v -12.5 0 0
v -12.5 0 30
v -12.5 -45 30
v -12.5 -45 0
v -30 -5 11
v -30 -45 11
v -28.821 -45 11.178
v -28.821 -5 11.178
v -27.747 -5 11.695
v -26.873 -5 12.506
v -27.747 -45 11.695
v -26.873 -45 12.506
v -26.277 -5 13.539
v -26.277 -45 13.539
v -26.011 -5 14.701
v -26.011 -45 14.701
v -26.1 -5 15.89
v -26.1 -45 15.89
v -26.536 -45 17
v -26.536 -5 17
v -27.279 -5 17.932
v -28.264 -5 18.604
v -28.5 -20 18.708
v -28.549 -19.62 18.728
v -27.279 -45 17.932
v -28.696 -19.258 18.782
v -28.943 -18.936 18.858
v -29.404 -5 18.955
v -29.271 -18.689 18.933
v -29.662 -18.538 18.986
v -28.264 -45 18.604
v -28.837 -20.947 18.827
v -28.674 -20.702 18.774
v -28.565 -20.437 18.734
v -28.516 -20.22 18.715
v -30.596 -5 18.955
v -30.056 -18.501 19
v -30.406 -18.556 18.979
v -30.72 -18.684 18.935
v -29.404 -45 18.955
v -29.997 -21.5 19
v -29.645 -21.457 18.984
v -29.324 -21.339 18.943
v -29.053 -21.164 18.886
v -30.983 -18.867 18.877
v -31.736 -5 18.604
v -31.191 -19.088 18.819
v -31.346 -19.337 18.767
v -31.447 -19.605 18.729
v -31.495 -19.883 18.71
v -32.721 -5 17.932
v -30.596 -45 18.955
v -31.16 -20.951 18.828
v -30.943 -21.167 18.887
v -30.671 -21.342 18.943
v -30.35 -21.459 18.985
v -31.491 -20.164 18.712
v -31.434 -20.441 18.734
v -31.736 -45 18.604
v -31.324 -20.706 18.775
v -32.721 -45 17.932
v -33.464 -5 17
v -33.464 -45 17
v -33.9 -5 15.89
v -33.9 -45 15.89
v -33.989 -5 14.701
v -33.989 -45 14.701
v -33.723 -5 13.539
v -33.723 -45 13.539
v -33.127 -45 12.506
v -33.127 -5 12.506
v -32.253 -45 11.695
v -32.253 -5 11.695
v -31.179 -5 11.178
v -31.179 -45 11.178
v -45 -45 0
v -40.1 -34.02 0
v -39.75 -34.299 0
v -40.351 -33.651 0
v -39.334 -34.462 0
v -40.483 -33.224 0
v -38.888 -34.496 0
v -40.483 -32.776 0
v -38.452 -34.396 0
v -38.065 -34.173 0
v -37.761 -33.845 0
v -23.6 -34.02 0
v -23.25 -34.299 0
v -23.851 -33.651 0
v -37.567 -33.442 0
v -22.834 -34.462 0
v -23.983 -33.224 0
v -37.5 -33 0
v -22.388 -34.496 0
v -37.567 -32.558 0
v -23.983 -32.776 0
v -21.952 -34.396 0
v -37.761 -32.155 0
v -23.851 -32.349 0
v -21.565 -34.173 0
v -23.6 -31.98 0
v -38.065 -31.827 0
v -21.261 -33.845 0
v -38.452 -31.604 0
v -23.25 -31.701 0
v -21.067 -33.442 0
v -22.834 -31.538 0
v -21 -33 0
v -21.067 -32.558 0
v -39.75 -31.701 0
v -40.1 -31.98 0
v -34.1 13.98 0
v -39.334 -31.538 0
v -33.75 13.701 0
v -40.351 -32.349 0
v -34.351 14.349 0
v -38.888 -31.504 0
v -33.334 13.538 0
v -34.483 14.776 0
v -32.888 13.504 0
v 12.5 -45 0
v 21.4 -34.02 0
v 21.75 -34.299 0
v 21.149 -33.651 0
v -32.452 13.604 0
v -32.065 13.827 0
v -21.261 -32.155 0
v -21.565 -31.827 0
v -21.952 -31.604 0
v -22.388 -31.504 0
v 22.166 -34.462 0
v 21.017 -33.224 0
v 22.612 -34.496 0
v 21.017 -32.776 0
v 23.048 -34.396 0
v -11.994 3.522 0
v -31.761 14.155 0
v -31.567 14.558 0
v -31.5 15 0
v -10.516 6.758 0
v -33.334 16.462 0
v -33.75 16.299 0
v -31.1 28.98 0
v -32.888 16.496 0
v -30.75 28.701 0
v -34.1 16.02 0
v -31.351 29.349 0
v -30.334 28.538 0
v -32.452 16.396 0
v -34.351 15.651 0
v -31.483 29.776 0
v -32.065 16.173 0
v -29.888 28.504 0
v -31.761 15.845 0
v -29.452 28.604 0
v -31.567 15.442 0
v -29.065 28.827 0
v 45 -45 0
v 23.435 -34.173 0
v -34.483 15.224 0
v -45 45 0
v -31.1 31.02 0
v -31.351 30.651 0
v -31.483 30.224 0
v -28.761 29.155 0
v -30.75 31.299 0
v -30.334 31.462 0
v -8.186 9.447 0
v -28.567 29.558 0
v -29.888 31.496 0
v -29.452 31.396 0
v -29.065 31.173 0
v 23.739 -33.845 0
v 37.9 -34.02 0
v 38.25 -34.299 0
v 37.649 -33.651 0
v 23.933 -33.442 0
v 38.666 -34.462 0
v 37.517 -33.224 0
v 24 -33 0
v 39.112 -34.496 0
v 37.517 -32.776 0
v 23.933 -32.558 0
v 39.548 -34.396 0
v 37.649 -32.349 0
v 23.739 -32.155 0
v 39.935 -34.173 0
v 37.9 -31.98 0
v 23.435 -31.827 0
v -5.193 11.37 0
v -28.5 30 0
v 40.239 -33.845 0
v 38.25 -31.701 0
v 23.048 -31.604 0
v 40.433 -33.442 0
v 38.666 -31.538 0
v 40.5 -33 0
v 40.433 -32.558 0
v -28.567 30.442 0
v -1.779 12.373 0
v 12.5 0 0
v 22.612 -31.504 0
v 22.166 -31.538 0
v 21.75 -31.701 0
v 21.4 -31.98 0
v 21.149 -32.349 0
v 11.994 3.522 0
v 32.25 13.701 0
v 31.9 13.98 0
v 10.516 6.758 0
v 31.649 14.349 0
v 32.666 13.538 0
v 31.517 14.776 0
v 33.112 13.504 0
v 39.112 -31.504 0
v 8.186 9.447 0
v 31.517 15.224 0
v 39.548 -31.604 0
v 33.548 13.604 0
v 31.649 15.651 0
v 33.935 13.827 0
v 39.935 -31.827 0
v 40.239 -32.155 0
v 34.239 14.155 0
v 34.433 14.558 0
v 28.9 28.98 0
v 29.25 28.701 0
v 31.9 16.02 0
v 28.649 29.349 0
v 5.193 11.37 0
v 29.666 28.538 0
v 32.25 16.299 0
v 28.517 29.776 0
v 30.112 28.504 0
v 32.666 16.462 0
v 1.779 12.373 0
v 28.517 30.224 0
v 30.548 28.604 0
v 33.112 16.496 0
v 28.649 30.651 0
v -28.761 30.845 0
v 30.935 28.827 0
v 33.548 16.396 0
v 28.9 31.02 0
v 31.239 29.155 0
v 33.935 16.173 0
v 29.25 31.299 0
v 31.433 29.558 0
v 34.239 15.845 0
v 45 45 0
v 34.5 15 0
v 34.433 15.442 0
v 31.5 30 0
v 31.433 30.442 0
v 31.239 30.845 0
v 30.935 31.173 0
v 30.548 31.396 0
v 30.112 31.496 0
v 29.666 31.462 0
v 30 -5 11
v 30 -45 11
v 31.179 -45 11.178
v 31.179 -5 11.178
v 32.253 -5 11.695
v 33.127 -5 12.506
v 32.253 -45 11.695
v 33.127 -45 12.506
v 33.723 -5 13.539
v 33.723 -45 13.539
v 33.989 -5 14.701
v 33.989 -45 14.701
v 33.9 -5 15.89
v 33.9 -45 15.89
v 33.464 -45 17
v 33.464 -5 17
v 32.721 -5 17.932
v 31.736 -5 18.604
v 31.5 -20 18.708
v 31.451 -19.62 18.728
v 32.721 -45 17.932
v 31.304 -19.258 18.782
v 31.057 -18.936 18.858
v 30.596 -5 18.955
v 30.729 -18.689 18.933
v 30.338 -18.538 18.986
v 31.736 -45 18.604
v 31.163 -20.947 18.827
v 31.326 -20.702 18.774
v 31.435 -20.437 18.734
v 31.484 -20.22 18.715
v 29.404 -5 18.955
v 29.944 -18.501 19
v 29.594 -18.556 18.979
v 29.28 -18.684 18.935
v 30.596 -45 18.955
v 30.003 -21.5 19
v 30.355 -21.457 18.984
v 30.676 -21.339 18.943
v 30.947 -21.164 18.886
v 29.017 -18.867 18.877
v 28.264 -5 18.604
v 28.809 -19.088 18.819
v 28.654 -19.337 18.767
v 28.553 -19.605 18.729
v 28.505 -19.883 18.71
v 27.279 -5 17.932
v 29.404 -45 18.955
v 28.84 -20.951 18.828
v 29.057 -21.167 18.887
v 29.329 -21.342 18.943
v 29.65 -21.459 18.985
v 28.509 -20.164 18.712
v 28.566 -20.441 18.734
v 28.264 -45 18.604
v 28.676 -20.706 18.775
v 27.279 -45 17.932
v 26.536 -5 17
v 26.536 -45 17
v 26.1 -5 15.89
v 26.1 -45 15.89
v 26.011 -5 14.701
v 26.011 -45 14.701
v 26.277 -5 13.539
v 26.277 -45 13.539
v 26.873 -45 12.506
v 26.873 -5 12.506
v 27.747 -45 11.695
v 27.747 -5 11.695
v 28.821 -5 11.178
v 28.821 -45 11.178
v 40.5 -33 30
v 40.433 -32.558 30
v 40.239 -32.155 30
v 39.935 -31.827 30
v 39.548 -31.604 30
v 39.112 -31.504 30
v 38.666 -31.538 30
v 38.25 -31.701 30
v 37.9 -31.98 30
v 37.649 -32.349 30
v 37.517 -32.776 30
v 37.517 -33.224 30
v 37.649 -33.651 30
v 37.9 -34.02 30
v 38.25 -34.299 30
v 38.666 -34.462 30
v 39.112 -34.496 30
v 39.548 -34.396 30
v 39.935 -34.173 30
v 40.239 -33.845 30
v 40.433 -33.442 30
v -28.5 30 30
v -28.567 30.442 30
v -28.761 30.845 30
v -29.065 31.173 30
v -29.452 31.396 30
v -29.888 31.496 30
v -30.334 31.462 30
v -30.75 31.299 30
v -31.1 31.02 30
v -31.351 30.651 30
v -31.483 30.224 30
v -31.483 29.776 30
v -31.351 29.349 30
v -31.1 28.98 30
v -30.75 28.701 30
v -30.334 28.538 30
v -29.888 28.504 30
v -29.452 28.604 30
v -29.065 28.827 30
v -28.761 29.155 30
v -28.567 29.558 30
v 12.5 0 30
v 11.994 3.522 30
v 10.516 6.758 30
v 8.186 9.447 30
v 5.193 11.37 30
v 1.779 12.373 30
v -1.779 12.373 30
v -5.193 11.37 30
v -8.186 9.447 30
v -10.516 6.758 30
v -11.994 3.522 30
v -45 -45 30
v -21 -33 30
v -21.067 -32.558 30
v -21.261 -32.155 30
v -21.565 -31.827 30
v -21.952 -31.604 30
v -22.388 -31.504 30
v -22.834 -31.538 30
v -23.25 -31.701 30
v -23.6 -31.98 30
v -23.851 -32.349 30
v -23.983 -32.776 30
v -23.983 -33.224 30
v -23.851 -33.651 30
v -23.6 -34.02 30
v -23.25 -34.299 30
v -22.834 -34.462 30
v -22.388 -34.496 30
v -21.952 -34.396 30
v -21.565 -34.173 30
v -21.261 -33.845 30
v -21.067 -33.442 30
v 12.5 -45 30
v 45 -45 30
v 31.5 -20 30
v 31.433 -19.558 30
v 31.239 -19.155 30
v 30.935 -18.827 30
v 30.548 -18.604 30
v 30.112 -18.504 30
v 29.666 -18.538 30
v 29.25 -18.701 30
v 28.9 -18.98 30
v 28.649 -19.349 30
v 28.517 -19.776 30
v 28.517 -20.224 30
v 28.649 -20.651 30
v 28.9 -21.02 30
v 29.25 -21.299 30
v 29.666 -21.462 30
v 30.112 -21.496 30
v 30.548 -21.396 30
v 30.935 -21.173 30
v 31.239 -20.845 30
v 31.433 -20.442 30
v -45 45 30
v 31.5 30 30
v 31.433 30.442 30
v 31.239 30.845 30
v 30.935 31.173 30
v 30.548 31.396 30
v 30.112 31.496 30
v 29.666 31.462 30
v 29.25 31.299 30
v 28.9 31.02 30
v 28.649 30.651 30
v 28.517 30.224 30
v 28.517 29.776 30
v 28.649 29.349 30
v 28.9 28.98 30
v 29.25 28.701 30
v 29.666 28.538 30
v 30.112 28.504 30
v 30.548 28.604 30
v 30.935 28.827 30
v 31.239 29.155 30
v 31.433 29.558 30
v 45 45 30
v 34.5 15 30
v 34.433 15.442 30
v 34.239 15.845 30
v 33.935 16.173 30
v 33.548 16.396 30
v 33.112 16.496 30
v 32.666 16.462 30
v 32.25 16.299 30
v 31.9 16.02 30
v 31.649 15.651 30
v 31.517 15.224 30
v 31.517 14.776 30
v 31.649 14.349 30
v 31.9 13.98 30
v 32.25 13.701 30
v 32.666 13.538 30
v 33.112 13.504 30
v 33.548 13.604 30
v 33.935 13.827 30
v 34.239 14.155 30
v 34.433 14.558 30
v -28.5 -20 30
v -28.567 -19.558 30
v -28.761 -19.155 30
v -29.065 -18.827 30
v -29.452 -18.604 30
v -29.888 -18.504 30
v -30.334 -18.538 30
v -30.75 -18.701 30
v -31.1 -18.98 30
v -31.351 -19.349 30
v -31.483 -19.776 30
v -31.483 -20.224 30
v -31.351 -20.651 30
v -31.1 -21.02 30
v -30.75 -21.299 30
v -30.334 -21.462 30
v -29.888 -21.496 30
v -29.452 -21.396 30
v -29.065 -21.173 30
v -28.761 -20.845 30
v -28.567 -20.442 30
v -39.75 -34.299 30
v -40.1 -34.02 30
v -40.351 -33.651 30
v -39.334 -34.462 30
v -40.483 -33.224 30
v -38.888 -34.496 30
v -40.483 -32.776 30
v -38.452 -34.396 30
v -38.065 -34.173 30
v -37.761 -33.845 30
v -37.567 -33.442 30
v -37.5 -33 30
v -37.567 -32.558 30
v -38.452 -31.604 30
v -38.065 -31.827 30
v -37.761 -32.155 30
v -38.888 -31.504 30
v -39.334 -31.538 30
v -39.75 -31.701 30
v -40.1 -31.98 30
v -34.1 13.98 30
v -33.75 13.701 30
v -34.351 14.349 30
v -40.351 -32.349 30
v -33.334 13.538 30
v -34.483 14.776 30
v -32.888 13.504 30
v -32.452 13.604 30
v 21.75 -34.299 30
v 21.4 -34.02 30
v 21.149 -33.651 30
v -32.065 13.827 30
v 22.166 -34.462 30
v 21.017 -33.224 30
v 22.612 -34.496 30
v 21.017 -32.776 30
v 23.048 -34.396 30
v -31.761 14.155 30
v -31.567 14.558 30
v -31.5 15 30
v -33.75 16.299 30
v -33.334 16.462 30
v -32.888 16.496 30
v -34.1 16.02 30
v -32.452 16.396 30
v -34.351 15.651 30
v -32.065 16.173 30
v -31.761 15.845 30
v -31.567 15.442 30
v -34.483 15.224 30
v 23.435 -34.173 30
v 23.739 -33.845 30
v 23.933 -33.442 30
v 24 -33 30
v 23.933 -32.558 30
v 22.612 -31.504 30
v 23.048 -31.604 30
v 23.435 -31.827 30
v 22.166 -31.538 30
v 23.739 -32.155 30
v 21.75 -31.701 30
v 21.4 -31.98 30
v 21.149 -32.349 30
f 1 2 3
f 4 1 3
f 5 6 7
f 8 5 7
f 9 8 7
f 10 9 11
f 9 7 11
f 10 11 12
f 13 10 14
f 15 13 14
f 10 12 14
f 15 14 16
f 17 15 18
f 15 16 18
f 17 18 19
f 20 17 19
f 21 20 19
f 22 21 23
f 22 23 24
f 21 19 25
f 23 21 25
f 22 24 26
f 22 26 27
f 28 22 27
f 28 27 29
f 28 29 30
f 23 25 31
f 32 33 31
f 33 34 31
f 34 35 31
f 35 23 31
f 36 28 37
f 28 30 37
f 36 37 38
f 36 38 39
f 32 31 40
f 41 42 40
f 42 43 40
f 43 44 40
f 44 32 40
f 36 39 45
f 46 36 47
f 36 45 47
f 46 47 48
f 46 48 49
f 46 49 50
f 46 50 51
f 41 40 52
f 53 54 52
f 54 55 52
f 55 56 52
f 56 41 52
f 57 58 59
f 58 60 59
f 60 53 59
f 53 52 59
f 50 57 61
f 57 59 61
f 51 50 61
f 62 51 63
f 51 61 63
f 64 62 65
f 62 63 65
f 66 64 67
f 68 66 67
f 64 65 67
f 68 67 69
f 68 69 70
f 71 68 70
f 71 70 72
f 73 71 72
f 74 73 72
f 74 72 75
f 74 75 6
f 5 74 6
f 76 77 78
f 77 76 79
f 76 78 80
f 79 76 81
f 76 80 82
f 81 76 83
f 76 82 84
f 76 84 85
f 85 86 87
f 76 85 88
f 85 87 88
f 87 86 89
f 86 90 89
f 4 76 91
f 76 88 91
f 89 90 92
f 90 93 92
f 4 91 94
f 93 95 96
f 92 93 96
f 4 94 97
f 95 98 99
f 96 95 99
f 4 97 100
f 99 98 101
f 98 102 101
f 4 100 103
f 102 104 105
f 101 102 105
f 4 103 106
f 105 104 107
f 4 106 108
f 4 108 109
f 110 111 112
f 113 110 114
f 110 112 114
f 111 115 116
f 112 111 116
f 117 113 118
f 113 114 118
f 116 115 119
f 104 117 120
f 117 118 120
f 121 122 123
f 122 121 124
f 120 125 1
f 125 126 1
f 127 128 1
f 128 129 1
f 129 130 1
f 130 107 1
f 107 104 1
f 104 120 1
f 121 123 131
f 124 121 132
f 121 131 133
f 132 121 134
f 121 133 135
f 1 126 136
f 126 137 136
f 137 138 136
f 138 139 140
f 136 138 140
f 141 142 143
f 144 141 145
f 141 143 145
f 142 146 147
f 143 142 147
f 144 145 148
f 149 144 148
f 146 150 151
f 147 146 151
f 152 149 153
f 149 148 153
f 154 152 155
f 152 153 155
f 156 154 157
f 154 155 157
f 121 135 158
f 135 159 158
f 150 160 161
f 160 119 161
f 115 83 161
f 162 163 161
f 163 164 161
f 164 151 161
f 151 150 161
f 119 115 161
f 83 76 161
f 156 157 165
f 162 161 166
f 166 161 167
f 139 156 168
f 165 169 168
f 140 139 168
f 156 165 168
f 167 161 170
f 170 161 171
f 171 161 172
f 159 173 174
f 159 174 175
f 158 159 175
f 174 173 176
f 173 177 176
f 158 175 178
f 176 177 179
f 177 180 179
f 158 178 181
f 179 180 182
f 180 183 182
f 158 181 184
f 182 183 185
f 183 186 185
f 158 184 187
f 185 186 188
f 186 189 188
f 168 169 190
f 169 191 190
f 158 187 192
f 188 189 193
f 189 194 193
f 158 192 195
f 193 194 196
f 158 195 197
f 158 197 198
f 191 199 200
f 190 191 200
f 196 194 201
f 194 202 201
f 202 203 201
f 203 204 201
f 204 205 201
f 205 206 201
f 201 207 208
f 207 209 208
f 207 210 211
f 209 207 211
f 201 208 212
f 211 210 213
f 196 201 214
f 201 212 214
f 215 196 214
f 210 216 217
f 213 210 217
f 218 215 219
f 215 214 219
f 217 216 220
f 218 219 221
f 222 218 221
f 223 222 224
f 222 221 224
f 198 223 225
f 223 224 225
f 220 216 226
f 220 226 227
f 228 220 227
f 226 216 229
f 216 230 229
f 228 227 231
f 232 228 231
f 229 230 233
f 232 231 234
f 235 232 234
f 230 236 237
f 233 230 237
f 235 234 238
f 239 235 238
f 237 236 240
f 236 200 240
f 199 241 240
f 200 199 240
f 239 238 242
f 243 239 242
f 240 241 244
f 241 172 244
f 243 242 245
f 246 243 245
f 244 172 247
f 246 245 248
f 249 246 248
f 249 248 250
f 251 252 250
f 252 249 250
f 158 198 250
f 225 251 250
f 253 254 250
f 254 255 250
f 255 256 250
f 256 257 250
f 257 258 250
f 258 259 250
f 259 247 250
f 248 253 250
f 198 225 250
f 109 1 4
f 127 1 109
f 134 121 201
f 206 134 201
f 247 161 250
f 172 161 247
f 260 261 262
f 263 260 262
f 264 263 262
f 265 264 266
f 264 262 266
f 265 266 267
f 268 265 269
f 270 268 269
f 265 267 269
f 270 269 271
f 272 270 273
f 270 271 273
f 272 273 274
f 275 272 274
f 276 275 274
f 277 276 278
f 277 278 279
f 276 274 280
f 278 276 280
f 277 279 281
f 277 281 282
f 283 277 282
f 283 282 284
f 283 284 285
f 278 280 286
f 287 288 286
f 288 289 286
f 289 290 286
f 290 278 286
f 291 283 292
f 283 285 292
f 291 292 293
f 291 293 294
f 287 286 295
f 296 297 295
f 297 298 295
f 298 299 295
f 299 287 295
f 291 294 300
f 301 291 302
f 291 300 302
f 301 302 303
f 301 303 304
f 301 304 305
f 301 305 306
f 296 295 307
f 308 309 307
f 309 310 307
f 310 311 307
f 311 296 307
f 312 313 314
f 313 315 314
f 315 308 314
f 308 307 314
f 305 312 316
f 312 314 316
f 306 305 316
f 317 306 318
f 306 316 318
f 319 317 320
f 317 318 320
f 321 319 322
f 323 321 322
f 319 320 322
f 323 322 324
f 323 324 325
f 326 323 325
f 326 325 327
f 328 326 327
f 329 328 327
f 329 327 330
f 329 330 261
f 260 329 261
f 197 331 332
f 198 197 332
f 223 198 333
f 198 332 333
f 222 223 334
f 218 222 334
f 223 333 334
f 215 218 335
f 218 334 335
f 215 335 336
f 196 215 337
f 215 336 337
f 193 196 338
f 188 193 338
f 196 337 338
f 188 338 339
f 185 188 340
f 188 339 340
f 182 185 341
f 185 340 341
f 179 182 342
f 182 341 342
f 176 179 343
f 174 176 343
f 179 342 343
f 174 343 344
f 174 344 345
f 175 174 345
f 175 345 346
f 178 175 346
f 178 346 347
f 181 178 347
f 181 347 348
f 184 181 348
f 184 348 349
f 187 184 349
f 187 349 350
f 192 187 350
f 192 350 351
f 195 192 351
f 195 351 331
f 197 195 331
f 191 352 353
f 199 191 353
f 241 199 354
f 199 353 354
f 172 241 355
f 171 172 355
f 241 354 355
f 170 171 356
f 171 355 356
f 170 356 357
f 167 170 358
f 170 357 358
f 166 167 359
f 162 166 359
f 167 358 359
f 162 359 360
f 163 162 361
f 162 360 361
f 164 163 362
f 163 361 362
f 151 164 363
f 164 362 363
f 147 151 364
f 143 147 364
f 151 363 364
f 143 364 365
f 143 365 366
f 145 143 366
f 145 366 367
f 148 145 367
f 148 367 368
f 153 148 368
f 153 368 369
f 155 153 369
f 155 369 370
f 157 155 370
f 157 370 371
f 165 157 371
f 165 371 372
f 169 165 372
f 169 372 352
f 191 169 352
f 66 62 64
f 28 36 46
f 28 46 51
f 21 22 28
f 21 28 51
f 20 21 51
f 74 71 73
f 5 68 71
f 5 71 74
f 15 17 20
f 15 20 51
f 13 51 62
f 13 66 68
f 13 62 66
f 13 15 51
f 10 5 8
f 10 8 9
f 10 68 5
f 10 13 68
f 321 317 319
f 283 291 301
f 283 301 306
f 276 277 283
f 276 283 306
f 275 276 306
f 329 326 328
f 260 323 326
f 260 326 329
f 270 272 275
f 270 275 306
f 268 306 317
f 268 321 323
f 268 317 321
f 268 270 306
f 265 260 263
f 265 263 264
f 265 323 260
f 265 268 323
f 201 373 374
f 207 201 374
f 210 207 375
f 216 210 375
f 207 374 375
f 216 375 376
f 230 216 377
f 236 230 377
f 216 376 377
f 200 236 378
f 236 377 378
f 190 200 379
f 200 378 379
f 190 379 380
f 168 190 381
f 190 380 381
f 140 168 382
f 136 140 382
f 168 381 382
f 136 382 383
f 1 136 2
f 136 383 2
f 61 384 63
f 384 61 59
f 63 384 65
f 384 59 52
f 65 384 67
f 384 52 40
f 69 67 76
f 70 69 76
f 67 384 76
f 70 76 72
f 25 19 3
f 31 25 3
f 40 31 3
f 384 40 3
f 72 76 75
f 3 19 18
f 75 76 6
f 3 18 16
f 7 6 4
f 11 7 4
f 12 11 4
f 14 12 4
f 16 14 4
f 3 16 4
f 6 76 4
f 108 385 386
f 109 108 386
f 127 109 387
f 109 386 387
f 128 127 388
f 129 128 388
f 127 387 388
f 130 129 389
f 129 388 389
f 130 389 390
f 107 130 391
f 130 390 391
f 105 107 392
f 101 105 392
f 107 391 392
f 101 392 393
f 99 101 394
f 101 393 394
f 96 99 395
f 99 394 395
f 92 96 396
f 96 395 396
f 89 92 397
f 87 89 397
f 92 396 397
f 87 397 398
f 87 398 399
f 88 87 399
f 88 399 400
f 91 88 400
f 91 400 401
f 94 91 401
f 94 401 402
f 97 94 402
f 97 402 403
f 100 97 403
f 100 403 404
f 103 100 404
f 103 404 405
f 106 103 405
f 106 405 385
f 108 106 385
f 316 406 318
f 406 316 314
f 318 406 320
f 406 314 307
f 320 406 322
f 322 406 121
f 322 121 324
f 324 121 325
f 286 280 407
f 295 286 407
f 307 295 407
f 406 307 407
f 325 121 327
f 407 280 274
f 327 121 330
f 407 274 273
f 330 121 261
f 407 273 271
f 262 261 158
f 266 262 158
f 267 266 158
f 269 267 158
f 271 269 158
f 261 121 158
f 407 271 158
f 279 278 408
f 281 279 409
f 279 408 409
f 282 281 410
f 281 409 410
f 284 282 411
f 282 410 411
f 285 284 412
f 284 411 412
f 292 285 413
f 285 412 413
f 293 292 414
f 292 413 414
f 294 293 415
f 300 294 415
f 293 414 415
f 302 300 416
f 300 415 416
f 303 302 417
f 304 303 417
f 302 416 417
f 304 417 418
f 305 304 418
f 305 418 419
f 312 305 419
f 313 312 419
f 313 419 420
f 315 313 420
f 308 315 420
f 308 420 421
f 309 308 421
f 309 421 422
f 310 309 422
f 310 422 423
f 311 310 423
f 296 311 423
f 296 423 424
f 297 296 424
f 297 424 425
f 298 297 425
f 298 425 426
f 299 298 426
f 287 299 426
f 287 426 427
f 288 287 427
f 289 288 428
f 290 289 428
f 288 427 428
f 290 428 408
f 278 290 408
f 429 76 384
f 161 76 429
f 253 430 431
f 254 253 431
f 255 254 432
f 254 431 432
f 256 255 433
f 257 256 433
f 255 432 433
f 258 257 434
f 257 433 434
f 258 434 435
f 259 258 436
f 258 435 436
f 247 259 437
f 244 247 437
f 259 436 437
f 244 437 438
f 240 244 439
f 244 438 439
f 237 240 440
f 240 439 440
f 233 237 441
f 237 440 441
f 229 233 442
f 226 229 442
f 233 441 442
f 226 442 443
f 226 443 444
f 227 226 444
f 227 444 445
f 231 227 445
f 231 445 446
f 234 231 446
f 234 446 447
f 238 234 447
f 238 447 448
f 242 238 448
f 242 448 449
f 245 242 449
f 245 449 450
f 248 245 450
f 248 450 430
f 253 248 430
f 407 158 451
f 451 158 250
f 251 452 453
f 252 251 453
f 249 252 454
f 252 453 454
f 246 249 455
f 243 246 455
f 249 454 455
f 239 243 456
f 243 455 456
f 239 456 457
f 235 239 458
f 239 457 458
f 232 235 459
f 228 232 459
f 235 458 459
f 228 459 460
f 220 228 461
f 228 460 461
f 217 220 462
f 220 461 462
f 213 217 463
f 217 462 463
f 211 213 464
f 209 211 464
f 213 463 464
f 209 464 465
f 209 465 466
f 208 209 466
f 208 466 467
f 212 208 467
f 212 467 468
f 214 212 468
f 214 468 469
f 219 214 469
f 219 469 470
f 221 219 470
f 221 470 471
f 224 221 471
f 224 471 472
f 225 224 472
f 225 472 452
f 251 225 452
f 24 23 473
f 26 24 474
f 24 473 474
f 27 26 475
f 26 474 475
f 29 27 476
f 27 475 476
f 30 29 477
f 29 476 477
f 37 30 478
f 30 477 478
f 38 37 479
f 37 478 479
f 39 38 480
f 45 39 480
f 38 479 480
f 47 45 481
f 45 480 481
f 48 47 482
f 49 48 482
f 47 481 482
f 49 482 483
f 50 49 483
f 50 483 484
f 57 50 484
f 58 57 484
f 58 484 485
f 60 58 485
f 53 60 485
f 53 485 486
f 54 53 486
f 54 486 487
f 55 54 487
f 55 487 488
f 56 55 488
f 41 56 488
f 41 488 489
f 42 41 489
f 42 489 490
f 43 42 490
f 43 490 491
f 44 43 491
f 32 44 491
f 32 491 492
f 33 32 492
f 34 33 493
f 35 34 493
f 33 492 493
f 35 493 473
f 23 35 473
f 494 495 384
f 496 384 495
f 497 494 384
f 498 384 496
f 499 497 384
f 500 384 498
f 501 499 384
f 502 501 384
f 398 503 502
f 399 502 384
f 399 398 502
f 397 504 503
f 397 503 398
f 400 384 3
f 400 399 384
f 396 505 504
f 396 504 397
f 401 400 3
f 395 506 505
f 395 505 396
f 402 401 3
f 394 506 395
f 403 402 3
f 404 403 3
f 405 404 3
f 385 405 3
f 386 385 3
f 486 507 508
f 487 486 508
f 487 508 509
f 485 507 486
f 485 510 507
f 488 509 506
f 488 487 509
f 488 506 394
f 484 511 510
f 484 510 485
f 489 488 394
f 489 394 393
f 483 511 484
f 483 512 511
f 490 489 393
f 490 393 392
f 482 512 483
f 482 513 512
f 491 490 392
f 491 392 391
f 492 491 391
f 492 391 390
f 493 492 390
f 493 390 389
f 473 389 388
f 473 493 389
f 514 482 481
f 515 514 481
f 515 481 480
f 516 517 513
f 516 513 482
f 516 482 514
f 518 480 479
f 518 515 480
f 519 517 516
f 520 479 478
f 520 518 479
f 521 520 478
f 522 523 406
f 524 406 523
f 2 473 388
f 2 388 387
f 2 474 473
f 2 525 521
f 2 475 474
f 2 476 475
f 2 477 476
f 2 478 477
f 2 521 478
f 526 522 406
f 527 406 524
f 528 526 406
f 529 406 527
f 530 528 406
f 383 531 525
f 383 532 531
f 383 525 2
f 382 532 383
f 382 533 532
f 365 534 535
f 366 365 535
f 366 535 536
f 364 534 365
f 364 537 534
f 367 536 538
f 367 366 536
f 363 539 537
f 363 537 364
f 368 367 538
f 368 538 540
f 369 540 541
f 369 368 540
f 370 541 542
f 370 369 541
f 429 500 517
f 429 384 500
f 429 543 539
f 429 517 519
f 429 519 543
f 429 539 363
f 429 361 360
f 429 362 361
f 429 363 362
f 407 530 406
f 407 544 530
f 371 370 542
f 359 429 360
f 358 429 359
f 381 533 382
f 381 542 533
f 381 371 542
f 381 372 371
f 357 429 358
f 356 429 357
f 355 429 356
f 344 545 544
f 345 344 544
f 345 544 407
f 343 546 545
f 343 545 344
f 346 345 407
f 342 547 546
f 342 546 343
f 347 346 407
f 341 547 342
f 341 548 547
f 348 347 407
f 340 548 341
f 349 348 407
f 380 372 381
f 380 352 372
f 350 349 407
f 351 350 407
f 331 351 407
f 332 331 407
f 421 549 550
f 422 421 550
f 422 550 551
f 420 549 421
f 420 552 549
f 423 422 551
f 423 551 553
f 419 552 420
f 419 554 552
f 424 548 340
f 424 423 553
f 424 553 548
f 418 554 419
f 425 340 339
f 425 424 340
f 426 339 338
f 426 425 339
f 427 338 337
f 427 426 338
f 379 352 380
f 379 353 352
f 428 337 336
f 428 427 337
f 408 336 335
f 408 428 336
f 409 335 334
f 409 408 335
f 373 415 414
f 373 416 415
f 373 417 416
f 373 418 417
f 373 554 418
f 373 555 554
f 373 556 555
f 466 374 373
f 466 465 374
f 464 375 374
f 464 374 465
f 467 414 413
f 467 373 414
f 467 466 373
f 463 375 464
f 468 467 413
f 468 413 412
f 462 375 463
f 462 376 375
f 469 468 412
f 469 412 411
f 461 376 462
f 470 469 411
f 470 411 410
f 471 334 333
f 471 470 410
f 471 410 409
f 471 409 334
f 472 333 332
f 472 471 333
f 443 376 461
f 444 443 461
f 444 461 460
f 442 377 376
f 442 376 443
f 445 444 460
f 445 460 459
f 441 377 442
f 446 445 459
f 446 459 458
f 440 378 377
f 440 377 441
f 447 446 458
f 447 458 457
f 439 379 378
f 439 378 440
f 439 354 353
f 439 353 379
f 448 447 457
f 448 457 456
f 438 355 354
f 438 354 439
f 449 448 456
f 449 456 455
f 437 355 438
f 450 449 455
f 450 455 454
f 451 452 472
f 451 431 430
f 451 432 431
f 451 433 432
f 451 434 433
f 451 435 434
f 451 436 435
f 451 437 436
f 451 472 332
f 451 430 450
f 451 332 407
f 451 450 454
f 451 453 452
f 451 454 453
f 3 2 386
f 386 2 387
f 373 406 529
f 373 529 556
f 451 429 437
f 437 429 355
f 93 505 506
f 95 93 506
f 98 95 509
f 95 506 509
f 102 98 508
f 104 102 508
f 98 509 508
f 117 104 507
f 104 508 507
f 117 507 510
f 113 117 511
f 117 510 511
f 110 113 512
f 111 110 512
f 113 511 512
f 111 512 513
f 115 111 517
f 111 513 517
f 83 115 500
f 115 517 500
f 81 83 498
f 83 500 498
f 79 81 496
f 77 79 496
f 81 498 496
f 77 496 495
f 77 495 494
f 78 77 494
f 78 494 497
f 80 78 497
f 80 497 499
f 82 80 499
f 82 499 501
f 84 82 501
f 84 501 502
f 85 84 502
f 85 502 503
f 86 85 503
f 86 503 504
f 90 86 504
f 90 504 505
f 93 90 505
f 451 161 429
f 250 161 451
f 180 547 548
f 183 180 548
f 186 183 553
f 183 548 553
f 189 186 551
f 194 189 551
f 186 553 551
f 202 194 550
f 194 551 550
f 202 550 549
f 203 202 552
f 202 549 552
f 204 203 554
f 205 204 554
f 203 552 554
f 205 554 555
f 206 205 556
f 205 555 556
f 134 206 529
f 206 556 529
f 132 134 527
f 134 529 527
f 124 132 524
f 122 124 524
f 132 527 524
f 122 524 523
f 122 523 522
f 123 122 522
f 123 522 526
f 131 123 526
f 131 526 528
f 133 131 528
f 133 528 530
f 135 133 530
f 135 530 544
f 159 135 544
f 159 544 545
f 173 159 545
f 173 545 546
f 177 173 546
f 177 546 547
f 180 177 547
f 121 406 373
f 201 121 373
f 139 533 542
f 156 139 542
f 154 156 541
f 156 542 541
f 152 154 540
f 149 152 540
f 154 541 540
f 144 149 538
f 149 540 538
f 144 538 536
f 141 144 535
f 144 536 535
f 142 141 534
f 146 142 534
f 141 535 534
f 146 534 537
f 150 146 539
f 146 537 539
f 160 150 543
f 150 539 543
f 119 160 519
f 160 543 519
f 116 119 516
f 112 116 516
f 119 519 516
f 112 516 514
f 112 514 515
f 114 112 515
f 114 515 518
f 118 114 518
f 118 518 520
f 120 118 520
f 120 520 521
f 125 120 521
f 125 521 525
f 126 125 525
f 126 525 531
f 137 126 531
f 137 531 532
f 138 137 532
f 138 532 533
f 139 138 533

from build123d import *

# Parameters (mm, degrees)
SKETCH1_W           = 90
SKETCH1_H           = 90
BOSS_EXTRUDE1_DEPTH = 30
SKETCH2_R           = 4
CUT_EXTRUDE1_DEPTH  = 40
SKETCH3_R           = 12.5
CUT_EXTRUDE2_DEPTH  = 35
SKETCH5_R           = 1.5
CUT_EXTRUDE3_DEPTH  = 40
SKETCH9_R           = 1.5
CUT_EXTRUDE4_DEPTH  = 15


with BuildPart() as part:
    # Sketch1 → Boss-Extrude1 (new body)
    with BuildSketch(Plane.XY):
        Rectangle(SKETCH1_W, SKETCH1_H)
    extrude(amount=BOSS_EXTRUDE1_DEPTH)

    # Sketch2 → Cut-Extrude1 (cut)
    with BuildSketch(Plane.XZ.offset(45)):
        with Locations(Location((-30, 15, 0), (0, 0, 270))):
            Circle(SKETCH2_R)
        with Locations(Location((30, 15, 0), (0, 0, 270))):
            Circle(SKETCH2_R)
    extrude(amount=-CUT_EXTRUDE1_DEPTH, mode=Mode.SUBTRACT)

    # Sketch3 → Cut-Extrude2 (cut)
    with BuildSketch(Plane.XY.offset(30)):
        with BuildLine():
            Line((12.5, -45), (12.5, 0))
            ThreePointArc((12.5, 0), (0, -12.5), (-12.5, 0))
            Line((-12.5, 0), (-12.5, -45))
            Line((-12.5, -45), (12.5, -45))
        make_face()
        Circle(SKETCH3_R)
    extrude(amount=-CUT_EXTRUDE2_DEPTH, mode=Mode.SUBTRACT)

    # Sketch5 → Cut-Extrude3 (cut)
    with BuildSketch(Plane.XY.offset(30)):
        with Locations((-30, 30)):
            Circle(SKETCH5_R)
        with Locations((-33, 15)):
            Circle(SKETCH5_R)
        with Locations((30, 30)):
            Circle(SKETCH5_R)
        with Locations((33, 15)):
            Circle(SKETCH5_R)
        with Locations((39, -33)):
            Circle(SKETCH5_R)
        with Locations((22.5, -33)):
            Circle(SKETCH5_R)
        with Locations((-22.5, -33)):
            Circle(SKETCH5_R)
        with Locations((-39, -33)):
            Circle(SKETCH5_R)
    extrude(amount=-CUT_EXTRUDE3_DEPTH, mode=Mode.SUBTRACT)

    # Sketch9 → Cut-Extrude4 (cut)
    with BuildSketch(Plane.XY.offset(30)):
        with Locations((-30, -20)):
            Circle(SKETCH9_R)
        with Locations((30, -20)):
            Circle(SKETCH9_R)
    extrude(amount=-CUT_EXTRUDE4_DEPTH, mode=Mode.SUBTRACT)


solid = part.part
